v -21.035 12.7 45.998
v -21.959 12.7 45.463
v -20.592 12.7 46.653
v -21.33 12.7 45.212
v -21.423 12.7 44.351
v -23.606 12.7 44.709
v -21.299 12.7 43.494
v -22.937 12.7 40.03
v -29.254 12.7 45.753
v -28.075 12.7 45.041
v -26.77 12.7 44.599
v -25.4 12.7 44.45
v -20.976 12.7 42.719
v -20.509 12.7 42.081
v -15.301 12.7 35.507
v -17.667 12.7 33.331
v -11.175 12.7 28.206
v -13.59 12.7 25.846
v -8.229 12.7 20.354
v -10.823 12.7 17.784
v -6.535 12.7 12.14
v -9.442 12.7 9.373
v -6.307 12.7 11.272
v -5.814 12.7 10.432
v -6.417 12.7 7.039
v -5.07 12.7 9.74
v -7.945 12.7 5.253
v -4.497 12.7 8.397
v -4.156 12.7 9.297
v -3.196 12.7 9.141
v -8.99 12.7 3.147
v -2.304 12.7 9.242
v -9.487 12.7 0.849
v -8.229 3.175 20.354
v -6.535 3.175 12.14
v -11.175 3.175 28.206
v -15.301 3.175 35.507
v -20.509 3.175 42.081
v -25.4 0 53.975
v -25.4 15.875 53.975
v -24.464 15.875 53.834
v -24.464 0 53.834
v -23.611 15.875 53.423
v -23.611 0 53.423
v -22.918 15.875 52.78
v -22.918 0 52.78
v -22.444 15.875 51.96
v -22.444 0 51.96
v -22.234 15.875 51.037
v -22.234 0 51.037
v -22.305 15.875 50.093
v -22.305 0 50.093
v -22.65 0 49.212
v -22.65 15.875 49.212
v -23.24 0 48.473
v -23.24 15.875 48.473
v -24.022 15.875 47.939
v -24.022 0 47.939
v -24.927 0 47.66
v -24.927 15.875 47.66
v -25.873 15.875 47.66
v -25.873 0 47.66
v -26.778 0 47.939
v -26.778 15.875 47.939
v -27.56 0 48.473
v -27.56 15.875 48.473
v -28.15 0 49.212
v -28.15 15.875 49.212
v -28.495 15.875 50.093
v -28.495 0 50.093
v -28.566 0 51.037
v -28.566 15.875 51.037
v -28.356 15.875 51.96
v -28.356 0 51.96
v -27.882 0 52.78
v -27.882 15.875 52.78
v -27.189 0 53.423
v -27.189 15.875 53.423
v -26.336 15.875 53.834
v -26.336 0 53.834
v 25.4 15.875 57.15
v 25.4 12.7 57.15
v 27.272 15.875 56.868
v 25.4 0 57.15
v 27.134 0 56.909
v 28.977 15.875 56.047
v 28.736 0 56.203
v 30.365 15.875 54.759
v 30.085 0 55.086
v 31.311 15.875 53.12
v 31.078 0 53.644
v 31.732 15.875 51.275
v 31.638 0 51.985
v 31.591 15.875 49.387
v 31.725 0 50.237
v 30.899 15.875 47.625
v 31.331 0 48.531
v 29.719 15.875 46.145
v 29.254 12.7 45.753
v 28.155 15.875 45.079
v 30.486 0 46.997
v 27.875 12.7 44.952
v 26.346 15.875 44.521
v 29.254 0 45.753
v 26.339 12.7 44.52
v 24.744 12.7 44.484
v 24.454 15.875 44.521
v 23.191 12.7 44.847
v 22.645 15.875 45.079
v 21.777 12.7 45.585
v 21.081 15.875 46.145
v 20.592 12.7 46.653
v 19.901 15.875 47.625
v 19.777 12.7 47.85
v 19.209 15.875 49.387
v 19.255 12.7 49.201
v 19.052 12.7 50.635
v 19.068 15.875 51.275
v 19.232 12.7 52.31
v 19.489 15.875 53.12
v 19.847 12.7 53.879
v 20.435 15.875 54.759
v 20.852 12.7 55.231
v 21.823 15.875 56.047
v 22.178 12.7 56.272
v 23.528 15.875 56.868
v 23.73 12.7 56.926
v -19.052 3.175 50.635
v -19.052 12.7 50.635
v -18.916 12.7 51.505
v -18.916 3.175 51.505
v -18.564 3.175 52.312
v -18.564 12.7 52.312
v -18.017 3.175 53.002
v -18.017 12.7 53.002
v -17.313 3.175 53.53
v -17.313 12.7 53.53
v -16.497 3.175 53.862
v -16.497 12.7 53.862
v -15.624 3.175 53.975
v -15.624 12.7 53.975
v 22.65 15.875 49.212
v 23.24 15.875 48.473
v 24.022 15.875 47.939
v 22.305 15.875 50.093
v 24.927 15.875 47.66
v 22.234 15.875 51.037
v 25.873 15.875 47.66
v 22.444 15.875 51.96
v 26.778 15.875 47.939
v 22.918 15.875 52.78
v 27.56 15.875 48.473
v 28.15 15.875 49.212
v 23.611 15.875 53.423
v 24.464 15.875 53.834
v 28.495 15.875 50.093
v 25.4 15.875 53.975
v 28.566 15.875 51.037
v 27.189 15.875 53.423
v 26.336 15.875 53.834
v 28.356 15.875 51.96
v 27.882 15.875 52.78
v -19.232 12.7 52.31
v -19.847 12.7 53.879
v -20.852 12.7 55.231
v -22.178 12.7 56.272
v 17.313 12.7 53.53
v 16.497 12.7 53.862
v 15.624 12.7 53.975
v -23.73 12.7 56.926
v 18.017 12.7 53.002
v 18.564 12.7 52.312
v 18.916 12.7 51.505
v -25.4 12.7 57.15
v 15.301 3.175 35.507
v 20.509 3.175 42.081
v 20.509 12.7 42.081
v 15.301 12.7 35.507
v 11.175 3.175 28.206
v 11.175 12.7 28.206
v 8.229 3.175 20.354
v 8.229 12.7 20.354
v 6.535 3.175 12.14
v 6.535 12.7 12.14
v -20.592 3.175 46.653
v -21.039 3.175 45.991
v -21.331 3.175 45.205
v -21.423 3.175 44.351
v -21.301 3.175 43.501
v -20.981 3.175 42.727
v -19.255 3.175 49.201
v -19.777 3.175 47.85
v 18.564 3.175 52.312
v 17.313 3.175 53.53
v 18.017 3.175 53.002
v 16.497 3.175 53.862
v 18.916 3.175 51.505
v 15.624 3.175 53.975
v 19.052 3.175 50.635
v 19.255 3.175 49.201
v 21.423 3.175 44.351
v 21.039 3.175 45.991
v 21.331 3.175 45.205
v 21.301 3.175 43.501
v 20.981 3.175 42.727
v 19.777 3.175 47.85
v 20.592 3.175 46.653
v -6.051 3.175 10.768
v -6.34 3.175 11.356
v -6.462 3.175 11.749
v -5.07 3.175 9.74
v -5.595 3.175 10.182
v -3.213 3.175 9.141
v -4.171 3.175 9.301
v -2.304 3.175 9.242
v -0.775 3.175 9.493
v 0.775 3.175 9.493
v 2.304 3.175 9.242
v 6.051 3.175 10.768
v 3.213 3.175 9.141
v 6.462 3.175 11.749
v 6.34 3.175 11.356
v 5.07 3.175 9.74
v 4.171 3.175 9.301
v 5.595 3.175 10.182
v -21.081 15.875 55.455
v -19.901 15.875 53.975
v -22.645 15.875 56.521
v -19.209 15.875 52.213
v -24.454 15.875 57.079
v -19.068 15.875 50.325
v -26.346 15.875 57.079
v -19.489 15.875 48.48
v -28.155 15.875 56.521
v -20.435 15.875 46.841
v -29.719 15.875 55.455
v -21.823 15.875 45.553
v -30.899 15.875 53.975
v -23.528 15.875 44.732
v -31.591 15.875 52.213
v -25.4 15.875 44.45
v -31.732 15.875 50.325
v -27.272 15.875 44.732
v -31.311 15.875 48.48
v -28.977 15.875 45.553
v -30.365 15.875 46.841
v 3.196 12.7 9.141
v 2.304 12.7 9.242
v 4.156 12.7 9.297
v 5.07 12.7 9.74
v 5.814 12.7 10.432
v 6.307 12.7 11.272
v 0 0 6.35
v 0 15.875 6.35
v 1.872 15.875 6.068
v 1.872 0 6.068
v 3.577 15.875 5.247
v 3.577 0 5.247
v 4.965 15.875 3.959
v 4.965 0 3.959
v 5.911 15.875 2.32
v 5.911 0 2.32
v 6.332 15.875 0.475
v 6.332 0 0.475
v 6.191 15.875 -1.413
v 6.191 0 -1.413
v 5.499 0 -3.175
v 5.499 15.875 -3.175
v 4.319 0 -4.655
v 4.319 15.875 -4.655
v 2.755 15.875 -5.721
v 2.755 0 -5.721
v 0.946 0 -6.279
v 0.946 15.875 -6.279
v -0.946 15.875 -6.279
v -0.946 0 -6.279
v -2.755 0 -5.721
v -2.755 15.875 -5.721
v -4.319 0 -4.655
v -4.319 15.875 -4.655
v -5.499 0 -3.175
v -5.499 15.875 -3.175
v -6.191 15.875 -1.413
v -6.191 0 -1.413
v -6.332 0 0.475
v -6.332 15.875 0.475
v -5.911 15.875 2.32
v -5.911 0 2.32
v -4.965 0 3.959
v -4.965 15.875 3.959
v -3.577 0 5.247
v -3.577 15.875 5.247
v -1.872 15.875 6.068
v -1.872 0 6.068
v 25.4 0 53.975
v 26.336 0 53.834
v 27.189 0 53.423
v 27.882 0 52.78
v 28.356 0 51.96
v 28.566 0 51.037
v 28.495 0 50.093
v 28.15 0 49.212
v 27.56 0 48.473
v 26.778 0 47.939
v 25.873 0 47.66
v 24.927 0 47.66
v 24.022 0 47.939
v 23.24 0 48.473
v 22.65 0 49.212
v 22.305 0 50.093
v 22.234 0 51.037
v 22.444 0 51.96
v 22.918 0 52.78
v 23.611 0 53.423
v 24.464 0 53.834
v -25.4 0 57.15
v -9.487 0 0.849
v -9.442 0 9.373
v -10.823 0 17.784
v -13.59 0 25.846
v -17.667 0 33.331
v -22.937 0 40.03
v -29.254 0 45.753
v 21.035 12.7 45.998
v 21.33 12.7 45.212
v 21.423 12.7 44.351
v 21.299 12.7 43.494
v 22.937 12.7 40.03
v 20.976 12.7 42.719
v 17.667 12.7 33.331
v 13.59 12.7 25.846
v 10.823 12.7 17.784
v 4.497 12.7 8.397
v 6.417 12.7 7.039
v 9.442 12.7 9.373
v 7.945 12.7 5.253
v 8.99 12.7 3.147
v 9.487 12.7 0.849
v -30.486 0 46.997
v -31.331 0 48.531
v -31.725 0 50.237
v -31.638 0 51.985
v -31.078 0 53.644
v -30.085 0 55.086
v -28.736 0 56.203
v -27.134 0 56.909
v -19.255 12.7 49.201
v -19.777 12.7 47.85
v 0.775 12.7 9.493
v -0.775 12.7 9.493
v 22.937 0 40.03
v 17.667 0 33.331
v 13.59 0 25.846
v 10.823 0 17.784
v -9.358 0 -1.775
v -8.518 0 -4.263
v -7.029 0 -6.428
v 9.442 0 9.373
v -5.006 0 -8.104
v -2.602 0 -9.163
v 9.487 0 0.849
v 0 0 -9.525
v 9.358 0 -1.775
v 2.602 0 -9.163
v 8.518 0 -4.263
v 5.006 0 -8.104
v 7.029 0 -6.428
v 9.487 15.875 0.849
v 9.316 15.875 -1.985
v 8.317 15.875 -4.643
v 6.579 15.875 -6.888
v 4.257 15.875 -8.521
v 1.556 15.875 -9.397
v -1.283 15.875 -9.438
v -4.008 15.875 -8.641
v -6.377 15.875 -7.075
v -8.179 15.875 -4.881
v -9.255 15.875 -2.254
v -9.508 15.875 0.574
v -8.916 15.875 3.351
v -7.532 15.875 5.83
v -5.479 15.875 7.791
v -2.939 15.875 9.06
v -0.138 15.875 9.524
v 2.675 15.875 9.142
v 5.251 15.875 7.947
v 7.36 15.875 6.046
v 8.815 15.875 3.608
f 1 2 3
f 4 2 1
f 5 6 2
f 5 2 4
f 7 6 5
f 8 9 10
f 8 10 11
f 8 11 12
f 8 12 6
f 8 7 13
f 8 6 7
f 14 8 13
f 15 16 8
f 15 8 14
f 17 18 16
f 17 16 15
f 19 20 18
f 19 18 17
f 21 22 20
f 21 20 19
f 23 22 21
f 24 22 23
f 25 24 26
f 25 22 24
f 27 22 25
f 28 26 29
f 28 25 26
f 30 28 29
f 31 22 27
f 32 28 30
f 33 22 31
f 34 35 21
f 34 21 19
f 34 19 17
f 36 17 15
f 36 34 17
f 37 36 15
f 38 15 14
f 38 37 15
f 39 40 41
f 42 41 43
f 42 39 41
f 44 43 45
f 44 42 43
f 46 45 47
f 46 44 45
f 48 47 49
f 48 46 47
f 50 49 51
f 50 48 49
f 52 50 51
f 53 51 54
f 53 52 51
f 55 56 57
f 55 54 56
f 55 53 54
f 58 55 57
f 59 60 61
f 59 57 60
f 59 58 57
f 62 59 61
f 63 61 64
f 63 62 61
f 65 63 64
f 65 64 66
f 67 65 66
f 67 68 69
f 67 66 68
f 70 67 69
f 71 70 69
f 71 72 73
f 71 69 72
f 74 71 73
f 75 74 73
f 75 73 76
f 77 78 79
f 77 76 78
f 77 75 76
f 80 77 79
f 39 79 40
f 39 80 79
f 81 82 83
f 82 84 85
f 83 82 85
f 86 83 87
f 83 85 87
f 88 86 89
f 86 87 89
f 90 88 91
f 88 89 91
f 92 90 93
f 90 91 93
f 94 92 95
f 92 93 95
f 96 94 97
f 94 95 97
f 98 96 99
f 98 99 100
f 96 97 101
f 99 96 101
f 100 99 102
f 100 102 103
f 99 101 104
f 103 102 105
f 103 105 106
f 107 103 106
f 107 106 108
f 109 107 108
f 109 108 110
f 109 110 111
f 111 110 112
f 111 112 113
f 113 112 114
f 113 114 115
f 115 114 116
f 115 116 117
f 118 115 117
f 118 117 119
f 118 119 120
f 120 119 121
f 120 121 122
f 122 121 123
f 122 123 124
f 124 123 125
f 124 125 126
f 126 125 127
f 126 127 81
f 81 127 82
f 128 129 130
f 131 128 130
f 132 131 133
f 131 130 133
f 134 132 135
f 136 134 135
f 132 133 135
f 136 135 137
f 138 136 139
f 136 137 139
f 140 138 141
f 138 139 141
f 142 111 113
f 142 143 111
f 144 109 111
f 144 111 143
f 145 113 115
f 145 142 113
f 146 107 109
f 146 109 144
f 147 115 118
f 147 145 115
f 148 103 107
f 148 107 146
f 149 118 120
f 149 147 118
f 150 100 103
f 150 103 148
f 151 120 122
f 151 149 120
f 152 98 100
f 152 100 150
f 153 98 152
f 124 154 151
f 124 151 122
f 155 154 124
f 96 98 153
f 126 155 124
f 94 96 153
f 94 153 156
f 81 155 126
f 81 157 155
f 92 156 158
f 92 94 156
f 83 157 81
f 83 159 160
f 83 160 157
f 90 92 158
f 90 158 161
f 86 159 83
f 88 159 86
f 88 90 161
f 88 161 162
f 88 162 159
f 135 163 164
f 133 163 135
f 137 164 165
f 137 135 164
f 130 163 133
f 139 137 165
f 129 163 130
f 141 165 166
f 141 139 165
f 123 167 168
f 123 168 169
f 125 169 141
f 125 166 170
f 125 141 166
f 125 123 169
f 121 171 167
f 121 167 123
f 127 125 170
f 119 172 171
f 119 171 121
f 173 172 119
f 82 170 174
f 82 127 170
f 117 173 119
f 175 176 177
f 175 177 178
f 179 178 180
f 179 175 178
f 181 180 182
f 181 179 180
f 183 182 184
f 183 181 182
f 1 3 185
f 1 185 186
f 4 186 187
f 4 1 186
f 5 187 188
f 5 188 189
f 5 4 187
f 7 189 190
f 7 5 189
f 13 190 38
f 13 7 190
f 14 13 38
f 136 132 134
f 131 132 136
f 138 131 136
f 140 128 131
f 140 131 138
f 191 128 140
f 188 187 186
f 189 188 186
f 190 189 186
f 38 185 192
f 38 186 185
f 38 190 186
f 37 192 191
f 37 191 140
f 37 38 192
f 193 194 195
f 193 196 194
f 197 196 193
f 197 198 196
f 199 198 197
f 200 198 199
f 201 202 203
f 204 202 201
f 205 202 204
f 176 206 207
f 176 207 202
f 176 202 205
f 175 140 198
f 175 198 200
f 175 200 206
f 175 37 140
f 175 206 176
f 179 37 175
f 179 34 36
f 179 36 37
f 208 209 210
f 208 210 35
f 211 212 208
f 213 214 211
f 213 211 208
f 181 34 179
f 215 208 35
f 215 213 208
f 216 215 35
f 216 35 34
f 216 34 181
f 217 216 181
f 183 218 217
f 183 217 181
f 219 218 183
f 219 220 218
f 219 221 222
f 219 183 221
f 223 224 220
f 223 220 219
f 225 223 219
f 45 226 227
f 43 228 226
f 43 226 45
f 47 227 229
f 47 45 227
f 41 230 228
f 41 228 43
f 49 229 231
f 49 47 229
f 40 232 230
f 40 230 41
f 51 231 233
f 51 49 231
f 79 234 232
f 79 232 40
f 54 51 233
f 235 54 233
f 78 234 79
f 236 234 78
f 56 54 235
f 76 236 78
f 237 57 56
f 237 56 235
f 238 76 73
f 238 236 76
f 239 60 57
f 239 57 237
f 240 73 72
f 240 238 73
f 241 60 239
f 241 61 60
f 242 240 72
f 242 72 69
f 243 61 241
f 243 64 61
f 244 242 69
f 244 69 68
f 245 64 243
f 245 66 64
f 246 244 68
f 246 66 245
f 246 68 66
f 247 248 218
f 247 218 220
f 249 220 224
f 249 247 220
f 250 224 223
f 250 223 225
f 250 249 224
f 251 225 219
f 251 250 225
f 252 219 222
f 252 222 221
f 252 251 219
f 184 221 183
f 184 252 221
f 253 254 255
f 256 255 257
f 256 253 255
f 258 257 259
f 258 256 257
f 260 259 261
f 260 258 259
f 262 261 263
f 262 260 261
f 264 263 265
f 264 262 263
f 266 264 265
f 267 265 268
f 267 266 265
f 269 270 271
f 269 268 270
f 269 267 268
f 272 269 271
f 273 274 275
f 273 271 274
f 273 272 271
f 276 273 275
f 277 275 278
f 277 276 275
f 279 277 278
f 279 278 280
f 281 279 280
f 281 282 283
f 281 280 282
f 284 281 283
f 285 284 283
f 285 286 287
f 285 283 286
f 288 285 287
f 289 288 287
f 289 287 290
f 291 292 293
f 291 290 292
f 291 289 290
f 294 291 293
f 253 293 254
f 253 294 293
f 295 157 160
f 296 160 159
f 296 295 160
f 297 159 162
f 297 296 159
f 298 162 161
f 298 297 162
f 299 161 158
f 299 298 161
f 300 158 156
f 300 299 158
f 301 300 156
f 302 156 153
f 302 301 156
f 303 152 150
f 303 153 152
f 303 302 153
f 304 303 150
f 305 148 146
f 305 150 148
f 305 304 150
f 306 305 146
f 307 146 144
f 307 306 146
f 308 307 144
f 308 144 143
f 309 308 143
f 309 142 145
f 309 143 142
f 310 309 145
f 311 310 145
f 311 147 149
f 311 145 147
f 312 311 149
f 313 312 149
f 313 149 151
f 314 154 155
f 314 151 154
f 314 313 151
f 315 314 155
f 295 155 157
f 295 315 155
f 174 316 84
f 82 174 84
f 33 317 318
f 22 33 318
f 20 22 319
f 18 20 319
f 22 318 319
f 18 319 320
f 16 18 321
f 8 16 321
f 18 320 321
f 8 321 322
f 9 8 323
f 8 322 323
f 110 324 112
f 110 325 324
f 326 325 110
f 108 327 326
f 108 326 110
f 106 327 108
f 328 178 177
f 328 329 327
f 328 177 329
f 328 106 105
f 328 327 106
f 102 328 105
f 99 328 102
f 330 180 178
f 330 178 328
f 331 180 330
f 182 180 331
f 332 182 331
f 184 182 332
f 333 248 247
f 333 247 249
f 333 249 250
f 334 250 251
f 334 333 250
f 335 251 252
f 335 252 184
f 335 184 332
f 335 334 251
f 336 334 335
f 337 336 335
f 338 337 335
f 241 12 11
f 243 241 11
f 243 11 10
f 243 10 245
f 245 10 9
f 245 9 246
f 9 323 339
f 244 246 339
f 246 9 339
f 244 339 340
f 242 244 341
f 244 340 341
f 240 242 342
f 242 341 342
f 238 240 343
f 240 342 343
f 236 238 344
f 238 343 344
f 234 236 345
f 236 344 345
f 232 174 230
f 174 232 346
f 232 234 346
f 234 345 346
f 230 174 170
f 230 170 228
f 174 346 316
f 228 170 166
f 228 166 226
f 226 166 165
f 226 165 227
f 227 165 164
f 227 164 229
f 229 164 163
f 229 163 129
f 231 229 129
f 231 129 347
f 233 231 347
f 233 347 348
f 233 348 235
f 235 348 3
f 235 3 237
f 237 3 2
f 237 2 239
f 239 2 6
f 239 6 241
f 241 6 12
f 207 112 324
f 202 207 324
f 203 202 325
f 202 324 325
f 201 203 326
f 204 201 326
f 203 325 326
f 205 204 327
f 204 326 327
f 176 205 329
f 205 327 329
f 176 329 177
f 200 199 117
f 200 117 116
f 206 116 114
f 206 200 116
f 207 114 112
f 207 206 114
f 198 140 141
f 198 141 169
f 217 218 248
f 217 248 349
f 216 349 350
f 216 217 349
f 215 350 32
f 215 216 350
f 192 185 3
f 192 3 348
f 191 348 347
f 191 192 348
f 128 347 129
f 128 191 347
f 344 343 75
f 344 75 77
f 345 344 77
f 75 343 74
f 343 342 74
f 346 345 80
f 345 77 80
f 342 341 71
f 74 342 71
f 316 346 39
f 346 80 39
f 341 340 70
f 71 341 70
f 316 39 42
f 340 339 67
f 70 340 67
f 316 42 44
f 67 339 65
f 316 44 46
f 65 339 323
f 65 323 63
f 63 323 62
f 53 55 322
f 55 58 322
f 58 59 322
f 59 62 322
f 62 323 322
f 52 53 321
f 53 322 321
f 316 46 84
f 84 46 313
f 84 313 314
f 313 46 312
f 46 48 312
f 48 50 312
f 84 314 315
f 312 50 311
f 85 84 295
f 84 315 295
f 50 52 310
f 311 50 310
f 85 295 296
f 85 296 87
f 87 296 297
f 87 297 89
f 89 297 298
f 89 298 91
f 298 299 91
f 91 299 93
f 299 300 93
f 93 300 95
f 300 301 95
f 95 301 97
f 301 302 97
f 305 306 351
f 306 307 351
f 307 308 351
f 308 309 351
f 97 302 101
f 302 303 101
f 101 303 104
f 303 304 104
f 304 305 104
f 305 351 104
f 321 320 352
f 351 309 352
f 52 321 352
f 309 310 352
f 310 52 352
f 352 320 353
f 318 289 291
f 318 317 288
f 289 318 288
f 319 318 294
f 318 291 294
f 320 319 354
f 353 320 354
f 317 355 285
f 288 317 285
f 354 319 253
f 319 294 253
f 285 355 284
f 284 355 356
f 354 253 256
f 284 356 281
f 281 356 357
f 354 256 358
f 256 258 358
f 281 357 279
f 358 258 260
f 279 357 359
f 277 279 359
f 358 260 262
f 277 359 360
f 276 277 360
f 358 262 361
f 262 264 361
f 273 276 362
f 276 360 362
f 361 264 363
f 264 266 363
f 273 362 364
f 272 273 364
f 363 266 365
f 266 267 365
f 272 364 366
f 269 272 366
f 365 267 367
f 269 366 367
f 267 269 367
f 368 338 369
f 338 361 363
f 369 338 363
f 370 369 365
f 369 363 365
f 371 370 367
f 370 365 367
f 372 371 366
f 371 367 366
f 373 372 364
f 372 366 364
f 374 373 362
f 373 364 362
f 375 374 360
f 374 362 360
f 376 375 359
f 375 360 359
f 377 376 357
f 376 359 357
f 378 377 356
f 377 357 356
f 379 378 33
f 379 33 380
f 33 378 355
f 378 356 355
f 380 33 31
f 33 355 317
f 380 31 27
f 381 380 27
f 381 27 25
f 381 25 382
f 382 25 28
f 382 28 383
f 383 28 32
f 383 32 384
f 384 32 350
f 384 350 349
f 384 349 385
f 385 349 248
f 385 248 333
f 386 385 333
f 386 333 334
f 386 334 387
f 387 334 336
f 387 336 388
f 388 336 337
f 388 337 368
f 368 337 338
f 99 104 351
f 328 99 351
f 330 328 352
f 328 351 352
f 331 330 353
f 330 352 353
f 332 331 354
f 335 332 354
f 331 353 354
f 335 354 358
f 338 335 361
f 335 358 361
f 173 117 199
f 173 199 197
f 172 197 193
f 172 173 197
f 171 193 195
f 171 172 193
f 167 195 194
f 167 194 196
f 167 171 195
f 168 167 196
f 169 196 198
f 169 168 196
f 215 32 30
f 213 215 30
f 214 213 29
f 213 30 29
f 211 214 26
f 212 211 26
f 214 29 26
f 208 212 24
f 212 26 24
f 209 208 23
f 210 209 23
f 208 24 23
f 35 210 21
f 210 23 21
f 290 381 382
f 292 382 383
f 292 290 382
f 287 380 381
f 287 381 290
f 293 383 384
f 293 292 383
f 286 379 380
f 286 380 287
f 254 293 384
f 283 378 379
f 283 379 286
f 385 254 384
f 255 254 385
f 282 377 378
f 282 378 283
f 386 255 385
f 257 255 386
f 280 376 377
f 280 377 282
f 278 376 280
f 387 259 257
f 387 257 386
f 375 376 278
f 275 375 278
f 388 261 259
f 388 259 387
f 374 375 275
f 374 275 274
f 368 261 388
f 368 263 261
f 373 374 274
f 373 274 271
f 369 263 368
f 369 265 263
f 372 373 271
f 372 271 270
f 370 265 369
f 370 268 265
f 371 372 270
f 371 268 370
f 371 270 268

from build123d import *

# Parameters (mm, degrees)
BOSS_EXTRUDE1_DEPTH = 12.7
OUTSIDE_CIRLCES_R   = 9.525
OUTSIDE_CIRLCES_R_2 = 6.35
BOSS_EXTRUDE2_DEPTH = 15.875
SKETCH2_R           = 6.35
SKETCH2_R_2         = 3.175
CUT_EXTRUDE2_DEPTH  = 68.277043819
SHELL1_START        = 3.175
SHELL1_DEPTH        = 9.525
FILLET1_R           = 3.429


# Read off the part's stored shape, not the designer's step: Shell1
with BuildPart() as part:
    # Sketch1 → Boss-Extrude1 (new body)
    with BuildSketch(Plane(origin=(0, 0, 0), x_dir=(1, 0, 0), z_dir=(0, 1, 0))):
        with BuildLine():
            Line((-25.4, -57.15), (25.4, -57.15))
            ThreePointArc((25.4, -57.15), (31.415385717, -52.834117665), (29.253859008, -45.753192024))
            ThreePointArc((29.253859008, -45.753192024), (13.590190704, -25.845719106), (9.487062801, -0.849272876))
            ThreePointArc((9.487062801, -0.849272876), (0, 9.525), (-9.487062801, -0.849272876))
            ThreePointArc((-9.487062801, -0.849272876), (-13.590190704, -25.845719106), (-29.253859008, -45.753192024))
            ThreePointArc((-29.253859008, -45.753192024), (-31.415385717, -52.834117665), (-25.4, -57.15))
        make_face()
    extrude(amount=BOSS_EXTRUDE1_DEPTH)

    # Outside Cirlces → Boss-Extrude2 (add)
    with BuildSketch(Plane(origin=(0, 0, 0), x_dir=(1, 0, 0), z_dir=(0, 1, 0))):
        with Locations(Location((0, 0, 0), (0, 0, 354.884571445))):
            Circle(OUTSIDE_CIRLCES_R)
        with Locations(Location((25.4, -50.8, 0), (0, 0, 270))):
            Circle(OUTSIDE_CIRLCES_R_2)
        with Locations(Location((-25.4, -50.8, 0), (0, 0, 90))):
            Circle(OUTSIDE_CIRLCES_R_2)
    extrude(amount=BOSS_EXTRUDE2_DEPTH)

    # Sketch2 → Cut-Extrude2 (cut, through all)
    with BuildSketch(Plane(origin=(0, 0, 0), x_dir=(1, 0, 0), z_dir=(0, 1, 0))):
        with Locations(Location((0, 0, 0), (0, 0, 270))):
            Circle(SKETCH2_R)
        with Locations(Location((-25.4, -50.8, 0), (0, 0, 270))):
            Circle(SKETCH2_R_2)
        with Locations(Location((25.4, -50.8, 0), (0, 0, 270))):
            Circle(SKETCH2_R_2)
    extrude(amount=CUT_EXTRUDE2_DEPTH, mode=Mode.SUBTRACT)

    # Shell1 outline → Shell1 (cut)
    with BuildSketch(Plane(origin=(0, 0, 0), x_dir=(1, 0, 0), z_dir=(0, 1, 0)).offset(SHELL1_START)):
        with BuildLine():
            ThreePointArc((-23.245193613, -44.826783996), (-19.436053982, -48.61966794), (-19.900738686, -53.975))
            Line((-19.900738686, -53.975), (19.900738686, -53.975))
            ThreePointArc((19.900738686, -53.975), (19.436053982, -48.61966794), (23.245193613, -44.826783996))
            ThreePointArc((23.245193613, -44.826783996), (10.964919098, -27.751584466), (6.1431994, -7.279198179))
            ThreePointArc((6.1431994, -7.279198179), (0, -9.525), (-6.1431994, -7.279198179))
            ThreePointArc((-6.1431994, -7.279198179), (-10.964919098, -27.751584466), (-23.245193613, -44.826783996))
        make_face()
    extrude(amount=SHELL1_DEPTH, mode=Mode.SUBTRACT)

    # Fillet1
    fillet1_edges = [part.edges().sort_by_distance(p)[0] for p in [
        (-6.1431994, 7.9375, 7.279198179),
        (-19.900738686, 7.9375, 53.975),
        (23.245193613, 7.9375, 44.826783996),
        (6.1431994, 7.9375, 7.279198179),
        (-23.245193613, 7.9375, 44.826783996),
        (19.900738686, 7.9375, 53.975),
    ]]
    fillet(fillet1_edges, radius=FILLET1_R)


solid = part.part
